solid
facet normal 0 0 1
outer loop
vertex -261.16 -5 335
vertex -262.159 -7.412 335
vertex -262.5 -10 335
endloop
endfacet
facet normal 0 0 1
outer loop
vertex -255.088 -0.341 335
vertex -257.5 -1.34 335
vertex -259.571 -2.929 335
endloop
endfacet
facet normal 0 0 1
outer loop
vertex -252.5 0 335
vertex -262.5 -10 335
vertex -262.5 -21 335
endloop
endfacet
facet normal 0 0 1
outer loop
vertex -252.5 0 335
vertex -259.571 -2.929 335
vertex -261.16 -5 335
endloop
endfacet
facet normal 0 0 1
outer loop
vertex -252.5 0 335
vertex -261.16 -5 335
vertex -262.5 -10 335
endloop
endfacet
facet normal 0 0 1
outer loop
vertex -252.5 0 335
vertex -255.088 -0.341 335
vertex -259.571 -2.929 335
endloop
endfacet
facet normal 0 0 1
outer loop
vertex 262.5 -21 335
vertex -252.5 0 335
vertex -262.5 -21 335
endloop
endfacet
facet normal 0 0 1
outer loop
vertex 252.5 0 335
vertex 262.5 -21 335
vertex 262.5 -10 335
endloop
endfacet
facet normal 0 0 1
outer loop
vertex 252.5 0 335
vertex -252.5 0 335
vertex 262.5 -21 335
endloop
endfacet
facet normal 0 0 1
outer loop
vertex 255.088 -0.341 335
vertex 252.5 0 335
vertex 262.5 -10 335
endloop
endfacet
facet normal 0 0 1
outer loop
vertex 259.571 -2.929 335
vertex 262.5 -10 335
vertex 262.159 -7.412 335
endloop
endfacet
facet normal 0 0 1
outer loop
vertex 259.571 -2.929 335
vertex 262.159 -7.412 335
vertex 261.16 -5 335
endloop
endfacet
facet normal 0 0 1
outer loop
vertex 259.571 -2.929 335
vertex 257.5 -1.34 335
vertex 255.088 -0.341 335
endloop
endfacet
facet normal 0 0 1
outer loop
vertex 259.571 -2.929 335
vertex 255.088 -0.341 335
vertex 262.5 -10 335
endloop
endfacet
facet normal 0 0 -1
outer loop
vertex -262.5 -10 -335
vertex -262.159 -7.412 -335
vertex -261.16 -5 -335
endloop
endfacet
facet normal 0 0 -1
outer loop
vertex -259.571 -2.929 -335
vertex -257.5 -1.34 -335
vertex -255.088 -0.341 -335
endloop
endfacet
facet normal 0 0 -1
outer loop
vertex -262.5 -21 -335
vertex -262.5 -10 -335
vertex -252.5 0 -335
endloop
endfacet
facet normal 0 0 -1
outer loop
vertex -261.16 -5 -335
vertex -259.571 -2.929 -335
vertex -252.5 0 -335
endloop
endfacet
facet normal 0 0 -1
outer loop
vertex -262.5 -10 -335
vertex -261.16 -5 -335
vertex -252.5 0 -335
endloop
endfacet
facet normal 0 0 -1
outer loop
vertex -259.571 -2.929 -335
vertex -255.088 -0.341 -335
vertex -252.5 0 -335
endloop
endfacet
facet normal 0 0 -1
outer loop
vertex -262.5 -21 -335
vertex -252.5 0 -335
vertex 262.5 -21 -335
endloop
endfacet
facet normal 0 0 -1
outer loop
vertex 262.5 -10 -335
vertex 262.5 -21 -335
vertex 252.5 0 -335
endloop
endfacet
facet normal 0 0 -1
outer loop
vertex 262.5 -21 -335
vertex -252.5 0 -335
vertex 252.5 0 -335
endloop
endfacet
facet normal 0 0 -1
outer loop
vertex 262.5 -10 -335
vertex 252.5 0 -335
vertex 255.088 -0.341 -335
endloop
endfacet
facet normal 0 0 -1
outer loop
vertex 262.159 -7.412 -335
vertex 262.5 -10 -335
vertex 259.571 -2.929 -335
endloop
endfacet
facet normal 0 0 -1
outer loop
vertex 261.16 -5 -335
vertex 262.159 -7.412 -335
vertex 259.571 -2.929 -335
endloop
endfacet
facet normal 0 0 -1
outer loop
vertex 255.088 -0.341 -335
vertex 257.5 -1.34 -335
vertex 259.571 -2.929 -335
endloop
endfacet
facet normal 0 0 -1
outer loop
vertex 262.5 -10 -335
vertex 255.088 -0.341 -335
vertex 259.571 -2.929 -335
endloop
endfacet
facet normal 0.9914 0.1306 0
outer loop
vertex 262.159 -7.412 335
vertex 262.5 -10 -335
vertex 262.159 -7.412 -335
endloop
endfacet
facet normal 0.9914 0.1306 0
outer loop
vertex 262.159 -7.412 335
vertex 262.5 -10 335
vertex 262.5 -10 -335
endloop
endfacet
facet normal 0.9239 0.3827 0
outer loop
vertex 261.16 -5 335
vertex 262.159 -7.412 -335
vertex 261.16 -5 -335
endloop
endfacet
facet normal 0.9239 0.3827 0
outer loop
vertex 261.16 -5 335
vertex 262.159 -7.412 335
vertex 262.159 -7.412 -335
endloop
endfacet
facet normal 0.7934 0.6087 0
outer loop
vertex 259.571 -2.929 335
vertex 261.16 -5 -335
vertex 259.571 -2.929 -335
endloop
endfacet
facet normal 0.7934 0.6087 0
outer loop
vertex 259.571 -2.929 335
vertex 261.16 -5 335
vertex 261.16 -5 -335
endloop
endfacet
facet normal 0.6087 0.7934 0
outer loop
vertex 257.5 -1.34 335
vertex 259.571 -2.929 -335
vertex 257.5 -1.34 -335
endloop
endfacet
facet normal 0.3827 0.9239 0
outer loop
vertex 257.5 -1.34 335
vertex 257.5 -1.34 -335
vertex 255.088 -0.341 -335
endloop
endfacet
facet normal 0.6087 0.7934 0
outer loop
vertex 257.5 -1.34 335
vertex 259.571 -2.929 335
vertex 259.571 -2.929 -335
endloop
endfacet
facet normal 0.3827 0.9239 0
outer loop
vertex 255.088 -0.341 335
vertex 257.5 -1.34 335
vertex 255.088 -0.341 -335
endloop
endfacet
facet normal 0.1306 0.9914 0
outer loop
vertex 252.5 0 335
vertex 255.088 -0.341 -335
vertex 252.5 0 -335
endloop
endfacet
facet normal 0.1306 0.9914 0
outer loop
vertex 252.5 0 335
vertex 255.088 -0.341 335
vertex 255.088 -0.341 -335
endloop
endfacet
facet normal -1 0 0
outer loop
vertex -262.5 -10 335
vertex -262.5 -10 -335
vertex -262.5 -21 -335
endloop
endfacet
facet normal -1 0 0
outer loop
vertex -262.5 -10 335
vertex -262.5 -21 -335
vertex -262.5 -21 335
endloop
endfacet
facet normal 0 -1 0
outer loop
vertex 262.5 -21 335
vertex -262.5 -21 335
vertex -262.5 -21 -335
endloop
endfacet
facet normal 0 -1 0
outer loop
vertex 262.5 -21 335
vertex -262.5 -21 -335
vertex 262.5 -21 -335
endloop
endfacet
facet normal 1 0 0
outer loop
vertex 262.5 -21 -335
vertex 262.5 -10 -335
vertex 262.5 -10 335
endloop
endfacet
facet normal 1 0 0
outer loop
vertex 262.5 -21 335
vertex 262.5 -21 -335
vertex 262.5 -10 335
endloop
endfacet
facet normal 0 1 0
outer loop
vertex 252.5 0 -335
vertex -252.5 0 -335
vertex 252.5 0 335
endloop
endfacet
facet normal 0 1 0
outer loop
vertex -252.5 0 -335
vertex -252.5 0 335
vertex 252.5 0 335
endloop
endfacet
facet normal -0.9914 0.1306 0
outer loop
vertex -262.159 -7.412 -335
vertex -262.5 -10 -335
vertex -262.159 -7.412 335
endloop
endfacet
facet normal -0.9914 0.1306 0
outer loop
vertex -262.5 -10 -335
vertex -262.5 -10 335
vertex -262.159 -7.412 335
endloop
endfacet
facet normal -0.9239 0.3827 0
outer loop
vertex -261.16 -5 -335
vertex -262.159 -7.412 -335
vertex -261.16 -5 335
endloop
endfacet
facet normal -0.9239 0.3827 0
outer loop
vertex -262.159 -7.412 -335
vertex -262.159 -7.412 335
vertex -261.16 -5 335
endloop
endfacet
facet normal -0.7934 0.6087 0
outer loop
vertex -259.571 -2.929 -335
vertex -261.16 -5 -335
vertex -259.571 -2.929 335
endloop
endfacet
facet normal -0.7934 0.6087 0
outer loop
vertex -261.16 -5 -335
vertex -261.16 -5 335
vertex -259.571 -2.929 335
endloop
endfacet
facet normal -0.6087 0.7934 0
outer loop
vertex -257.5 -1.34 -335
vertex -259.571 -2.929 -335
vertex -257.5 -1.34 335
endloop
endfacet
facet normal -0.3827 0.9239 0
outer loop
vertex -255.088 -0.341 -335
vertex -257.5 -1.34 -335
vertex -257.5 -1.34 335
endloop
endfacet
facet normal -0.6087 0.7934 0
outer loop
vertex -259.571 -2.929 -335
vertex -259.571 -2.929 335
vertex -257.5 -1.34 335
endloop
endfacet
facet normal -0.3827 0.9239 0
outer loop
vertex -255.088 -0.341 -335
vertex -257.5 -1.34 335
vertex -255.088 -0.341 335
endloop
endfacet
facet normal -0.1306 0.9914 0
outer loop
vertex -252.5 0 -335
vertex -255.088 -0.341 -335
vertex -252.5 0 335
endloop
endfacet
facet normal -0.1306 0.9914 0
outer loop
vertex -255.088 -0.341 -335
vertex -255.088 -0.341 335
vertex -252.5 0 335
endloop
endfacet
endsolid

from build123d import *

# Parameters (mm, degrees)
F0_W     = 525
F0_H     = 670
F1_DEPTH = 21
F2_R     = 10


with BuildPart() as f1:
    # F0 (on Front) → F1 (new body)
    with BuildSketch(Plane.XZ):
        Rectangle(F0_W, F0_H)
    extrude(amount=F1_DEPTH)

    # F2
    f2_edges = [f1.edges().sort_by_distance(p)[0] for p in [
        (-262.5, 0, 0),
        (262.5, 0, 0),
    ]]
    fillet(f2_edges, radius=F2_R)


solid = f1.part
